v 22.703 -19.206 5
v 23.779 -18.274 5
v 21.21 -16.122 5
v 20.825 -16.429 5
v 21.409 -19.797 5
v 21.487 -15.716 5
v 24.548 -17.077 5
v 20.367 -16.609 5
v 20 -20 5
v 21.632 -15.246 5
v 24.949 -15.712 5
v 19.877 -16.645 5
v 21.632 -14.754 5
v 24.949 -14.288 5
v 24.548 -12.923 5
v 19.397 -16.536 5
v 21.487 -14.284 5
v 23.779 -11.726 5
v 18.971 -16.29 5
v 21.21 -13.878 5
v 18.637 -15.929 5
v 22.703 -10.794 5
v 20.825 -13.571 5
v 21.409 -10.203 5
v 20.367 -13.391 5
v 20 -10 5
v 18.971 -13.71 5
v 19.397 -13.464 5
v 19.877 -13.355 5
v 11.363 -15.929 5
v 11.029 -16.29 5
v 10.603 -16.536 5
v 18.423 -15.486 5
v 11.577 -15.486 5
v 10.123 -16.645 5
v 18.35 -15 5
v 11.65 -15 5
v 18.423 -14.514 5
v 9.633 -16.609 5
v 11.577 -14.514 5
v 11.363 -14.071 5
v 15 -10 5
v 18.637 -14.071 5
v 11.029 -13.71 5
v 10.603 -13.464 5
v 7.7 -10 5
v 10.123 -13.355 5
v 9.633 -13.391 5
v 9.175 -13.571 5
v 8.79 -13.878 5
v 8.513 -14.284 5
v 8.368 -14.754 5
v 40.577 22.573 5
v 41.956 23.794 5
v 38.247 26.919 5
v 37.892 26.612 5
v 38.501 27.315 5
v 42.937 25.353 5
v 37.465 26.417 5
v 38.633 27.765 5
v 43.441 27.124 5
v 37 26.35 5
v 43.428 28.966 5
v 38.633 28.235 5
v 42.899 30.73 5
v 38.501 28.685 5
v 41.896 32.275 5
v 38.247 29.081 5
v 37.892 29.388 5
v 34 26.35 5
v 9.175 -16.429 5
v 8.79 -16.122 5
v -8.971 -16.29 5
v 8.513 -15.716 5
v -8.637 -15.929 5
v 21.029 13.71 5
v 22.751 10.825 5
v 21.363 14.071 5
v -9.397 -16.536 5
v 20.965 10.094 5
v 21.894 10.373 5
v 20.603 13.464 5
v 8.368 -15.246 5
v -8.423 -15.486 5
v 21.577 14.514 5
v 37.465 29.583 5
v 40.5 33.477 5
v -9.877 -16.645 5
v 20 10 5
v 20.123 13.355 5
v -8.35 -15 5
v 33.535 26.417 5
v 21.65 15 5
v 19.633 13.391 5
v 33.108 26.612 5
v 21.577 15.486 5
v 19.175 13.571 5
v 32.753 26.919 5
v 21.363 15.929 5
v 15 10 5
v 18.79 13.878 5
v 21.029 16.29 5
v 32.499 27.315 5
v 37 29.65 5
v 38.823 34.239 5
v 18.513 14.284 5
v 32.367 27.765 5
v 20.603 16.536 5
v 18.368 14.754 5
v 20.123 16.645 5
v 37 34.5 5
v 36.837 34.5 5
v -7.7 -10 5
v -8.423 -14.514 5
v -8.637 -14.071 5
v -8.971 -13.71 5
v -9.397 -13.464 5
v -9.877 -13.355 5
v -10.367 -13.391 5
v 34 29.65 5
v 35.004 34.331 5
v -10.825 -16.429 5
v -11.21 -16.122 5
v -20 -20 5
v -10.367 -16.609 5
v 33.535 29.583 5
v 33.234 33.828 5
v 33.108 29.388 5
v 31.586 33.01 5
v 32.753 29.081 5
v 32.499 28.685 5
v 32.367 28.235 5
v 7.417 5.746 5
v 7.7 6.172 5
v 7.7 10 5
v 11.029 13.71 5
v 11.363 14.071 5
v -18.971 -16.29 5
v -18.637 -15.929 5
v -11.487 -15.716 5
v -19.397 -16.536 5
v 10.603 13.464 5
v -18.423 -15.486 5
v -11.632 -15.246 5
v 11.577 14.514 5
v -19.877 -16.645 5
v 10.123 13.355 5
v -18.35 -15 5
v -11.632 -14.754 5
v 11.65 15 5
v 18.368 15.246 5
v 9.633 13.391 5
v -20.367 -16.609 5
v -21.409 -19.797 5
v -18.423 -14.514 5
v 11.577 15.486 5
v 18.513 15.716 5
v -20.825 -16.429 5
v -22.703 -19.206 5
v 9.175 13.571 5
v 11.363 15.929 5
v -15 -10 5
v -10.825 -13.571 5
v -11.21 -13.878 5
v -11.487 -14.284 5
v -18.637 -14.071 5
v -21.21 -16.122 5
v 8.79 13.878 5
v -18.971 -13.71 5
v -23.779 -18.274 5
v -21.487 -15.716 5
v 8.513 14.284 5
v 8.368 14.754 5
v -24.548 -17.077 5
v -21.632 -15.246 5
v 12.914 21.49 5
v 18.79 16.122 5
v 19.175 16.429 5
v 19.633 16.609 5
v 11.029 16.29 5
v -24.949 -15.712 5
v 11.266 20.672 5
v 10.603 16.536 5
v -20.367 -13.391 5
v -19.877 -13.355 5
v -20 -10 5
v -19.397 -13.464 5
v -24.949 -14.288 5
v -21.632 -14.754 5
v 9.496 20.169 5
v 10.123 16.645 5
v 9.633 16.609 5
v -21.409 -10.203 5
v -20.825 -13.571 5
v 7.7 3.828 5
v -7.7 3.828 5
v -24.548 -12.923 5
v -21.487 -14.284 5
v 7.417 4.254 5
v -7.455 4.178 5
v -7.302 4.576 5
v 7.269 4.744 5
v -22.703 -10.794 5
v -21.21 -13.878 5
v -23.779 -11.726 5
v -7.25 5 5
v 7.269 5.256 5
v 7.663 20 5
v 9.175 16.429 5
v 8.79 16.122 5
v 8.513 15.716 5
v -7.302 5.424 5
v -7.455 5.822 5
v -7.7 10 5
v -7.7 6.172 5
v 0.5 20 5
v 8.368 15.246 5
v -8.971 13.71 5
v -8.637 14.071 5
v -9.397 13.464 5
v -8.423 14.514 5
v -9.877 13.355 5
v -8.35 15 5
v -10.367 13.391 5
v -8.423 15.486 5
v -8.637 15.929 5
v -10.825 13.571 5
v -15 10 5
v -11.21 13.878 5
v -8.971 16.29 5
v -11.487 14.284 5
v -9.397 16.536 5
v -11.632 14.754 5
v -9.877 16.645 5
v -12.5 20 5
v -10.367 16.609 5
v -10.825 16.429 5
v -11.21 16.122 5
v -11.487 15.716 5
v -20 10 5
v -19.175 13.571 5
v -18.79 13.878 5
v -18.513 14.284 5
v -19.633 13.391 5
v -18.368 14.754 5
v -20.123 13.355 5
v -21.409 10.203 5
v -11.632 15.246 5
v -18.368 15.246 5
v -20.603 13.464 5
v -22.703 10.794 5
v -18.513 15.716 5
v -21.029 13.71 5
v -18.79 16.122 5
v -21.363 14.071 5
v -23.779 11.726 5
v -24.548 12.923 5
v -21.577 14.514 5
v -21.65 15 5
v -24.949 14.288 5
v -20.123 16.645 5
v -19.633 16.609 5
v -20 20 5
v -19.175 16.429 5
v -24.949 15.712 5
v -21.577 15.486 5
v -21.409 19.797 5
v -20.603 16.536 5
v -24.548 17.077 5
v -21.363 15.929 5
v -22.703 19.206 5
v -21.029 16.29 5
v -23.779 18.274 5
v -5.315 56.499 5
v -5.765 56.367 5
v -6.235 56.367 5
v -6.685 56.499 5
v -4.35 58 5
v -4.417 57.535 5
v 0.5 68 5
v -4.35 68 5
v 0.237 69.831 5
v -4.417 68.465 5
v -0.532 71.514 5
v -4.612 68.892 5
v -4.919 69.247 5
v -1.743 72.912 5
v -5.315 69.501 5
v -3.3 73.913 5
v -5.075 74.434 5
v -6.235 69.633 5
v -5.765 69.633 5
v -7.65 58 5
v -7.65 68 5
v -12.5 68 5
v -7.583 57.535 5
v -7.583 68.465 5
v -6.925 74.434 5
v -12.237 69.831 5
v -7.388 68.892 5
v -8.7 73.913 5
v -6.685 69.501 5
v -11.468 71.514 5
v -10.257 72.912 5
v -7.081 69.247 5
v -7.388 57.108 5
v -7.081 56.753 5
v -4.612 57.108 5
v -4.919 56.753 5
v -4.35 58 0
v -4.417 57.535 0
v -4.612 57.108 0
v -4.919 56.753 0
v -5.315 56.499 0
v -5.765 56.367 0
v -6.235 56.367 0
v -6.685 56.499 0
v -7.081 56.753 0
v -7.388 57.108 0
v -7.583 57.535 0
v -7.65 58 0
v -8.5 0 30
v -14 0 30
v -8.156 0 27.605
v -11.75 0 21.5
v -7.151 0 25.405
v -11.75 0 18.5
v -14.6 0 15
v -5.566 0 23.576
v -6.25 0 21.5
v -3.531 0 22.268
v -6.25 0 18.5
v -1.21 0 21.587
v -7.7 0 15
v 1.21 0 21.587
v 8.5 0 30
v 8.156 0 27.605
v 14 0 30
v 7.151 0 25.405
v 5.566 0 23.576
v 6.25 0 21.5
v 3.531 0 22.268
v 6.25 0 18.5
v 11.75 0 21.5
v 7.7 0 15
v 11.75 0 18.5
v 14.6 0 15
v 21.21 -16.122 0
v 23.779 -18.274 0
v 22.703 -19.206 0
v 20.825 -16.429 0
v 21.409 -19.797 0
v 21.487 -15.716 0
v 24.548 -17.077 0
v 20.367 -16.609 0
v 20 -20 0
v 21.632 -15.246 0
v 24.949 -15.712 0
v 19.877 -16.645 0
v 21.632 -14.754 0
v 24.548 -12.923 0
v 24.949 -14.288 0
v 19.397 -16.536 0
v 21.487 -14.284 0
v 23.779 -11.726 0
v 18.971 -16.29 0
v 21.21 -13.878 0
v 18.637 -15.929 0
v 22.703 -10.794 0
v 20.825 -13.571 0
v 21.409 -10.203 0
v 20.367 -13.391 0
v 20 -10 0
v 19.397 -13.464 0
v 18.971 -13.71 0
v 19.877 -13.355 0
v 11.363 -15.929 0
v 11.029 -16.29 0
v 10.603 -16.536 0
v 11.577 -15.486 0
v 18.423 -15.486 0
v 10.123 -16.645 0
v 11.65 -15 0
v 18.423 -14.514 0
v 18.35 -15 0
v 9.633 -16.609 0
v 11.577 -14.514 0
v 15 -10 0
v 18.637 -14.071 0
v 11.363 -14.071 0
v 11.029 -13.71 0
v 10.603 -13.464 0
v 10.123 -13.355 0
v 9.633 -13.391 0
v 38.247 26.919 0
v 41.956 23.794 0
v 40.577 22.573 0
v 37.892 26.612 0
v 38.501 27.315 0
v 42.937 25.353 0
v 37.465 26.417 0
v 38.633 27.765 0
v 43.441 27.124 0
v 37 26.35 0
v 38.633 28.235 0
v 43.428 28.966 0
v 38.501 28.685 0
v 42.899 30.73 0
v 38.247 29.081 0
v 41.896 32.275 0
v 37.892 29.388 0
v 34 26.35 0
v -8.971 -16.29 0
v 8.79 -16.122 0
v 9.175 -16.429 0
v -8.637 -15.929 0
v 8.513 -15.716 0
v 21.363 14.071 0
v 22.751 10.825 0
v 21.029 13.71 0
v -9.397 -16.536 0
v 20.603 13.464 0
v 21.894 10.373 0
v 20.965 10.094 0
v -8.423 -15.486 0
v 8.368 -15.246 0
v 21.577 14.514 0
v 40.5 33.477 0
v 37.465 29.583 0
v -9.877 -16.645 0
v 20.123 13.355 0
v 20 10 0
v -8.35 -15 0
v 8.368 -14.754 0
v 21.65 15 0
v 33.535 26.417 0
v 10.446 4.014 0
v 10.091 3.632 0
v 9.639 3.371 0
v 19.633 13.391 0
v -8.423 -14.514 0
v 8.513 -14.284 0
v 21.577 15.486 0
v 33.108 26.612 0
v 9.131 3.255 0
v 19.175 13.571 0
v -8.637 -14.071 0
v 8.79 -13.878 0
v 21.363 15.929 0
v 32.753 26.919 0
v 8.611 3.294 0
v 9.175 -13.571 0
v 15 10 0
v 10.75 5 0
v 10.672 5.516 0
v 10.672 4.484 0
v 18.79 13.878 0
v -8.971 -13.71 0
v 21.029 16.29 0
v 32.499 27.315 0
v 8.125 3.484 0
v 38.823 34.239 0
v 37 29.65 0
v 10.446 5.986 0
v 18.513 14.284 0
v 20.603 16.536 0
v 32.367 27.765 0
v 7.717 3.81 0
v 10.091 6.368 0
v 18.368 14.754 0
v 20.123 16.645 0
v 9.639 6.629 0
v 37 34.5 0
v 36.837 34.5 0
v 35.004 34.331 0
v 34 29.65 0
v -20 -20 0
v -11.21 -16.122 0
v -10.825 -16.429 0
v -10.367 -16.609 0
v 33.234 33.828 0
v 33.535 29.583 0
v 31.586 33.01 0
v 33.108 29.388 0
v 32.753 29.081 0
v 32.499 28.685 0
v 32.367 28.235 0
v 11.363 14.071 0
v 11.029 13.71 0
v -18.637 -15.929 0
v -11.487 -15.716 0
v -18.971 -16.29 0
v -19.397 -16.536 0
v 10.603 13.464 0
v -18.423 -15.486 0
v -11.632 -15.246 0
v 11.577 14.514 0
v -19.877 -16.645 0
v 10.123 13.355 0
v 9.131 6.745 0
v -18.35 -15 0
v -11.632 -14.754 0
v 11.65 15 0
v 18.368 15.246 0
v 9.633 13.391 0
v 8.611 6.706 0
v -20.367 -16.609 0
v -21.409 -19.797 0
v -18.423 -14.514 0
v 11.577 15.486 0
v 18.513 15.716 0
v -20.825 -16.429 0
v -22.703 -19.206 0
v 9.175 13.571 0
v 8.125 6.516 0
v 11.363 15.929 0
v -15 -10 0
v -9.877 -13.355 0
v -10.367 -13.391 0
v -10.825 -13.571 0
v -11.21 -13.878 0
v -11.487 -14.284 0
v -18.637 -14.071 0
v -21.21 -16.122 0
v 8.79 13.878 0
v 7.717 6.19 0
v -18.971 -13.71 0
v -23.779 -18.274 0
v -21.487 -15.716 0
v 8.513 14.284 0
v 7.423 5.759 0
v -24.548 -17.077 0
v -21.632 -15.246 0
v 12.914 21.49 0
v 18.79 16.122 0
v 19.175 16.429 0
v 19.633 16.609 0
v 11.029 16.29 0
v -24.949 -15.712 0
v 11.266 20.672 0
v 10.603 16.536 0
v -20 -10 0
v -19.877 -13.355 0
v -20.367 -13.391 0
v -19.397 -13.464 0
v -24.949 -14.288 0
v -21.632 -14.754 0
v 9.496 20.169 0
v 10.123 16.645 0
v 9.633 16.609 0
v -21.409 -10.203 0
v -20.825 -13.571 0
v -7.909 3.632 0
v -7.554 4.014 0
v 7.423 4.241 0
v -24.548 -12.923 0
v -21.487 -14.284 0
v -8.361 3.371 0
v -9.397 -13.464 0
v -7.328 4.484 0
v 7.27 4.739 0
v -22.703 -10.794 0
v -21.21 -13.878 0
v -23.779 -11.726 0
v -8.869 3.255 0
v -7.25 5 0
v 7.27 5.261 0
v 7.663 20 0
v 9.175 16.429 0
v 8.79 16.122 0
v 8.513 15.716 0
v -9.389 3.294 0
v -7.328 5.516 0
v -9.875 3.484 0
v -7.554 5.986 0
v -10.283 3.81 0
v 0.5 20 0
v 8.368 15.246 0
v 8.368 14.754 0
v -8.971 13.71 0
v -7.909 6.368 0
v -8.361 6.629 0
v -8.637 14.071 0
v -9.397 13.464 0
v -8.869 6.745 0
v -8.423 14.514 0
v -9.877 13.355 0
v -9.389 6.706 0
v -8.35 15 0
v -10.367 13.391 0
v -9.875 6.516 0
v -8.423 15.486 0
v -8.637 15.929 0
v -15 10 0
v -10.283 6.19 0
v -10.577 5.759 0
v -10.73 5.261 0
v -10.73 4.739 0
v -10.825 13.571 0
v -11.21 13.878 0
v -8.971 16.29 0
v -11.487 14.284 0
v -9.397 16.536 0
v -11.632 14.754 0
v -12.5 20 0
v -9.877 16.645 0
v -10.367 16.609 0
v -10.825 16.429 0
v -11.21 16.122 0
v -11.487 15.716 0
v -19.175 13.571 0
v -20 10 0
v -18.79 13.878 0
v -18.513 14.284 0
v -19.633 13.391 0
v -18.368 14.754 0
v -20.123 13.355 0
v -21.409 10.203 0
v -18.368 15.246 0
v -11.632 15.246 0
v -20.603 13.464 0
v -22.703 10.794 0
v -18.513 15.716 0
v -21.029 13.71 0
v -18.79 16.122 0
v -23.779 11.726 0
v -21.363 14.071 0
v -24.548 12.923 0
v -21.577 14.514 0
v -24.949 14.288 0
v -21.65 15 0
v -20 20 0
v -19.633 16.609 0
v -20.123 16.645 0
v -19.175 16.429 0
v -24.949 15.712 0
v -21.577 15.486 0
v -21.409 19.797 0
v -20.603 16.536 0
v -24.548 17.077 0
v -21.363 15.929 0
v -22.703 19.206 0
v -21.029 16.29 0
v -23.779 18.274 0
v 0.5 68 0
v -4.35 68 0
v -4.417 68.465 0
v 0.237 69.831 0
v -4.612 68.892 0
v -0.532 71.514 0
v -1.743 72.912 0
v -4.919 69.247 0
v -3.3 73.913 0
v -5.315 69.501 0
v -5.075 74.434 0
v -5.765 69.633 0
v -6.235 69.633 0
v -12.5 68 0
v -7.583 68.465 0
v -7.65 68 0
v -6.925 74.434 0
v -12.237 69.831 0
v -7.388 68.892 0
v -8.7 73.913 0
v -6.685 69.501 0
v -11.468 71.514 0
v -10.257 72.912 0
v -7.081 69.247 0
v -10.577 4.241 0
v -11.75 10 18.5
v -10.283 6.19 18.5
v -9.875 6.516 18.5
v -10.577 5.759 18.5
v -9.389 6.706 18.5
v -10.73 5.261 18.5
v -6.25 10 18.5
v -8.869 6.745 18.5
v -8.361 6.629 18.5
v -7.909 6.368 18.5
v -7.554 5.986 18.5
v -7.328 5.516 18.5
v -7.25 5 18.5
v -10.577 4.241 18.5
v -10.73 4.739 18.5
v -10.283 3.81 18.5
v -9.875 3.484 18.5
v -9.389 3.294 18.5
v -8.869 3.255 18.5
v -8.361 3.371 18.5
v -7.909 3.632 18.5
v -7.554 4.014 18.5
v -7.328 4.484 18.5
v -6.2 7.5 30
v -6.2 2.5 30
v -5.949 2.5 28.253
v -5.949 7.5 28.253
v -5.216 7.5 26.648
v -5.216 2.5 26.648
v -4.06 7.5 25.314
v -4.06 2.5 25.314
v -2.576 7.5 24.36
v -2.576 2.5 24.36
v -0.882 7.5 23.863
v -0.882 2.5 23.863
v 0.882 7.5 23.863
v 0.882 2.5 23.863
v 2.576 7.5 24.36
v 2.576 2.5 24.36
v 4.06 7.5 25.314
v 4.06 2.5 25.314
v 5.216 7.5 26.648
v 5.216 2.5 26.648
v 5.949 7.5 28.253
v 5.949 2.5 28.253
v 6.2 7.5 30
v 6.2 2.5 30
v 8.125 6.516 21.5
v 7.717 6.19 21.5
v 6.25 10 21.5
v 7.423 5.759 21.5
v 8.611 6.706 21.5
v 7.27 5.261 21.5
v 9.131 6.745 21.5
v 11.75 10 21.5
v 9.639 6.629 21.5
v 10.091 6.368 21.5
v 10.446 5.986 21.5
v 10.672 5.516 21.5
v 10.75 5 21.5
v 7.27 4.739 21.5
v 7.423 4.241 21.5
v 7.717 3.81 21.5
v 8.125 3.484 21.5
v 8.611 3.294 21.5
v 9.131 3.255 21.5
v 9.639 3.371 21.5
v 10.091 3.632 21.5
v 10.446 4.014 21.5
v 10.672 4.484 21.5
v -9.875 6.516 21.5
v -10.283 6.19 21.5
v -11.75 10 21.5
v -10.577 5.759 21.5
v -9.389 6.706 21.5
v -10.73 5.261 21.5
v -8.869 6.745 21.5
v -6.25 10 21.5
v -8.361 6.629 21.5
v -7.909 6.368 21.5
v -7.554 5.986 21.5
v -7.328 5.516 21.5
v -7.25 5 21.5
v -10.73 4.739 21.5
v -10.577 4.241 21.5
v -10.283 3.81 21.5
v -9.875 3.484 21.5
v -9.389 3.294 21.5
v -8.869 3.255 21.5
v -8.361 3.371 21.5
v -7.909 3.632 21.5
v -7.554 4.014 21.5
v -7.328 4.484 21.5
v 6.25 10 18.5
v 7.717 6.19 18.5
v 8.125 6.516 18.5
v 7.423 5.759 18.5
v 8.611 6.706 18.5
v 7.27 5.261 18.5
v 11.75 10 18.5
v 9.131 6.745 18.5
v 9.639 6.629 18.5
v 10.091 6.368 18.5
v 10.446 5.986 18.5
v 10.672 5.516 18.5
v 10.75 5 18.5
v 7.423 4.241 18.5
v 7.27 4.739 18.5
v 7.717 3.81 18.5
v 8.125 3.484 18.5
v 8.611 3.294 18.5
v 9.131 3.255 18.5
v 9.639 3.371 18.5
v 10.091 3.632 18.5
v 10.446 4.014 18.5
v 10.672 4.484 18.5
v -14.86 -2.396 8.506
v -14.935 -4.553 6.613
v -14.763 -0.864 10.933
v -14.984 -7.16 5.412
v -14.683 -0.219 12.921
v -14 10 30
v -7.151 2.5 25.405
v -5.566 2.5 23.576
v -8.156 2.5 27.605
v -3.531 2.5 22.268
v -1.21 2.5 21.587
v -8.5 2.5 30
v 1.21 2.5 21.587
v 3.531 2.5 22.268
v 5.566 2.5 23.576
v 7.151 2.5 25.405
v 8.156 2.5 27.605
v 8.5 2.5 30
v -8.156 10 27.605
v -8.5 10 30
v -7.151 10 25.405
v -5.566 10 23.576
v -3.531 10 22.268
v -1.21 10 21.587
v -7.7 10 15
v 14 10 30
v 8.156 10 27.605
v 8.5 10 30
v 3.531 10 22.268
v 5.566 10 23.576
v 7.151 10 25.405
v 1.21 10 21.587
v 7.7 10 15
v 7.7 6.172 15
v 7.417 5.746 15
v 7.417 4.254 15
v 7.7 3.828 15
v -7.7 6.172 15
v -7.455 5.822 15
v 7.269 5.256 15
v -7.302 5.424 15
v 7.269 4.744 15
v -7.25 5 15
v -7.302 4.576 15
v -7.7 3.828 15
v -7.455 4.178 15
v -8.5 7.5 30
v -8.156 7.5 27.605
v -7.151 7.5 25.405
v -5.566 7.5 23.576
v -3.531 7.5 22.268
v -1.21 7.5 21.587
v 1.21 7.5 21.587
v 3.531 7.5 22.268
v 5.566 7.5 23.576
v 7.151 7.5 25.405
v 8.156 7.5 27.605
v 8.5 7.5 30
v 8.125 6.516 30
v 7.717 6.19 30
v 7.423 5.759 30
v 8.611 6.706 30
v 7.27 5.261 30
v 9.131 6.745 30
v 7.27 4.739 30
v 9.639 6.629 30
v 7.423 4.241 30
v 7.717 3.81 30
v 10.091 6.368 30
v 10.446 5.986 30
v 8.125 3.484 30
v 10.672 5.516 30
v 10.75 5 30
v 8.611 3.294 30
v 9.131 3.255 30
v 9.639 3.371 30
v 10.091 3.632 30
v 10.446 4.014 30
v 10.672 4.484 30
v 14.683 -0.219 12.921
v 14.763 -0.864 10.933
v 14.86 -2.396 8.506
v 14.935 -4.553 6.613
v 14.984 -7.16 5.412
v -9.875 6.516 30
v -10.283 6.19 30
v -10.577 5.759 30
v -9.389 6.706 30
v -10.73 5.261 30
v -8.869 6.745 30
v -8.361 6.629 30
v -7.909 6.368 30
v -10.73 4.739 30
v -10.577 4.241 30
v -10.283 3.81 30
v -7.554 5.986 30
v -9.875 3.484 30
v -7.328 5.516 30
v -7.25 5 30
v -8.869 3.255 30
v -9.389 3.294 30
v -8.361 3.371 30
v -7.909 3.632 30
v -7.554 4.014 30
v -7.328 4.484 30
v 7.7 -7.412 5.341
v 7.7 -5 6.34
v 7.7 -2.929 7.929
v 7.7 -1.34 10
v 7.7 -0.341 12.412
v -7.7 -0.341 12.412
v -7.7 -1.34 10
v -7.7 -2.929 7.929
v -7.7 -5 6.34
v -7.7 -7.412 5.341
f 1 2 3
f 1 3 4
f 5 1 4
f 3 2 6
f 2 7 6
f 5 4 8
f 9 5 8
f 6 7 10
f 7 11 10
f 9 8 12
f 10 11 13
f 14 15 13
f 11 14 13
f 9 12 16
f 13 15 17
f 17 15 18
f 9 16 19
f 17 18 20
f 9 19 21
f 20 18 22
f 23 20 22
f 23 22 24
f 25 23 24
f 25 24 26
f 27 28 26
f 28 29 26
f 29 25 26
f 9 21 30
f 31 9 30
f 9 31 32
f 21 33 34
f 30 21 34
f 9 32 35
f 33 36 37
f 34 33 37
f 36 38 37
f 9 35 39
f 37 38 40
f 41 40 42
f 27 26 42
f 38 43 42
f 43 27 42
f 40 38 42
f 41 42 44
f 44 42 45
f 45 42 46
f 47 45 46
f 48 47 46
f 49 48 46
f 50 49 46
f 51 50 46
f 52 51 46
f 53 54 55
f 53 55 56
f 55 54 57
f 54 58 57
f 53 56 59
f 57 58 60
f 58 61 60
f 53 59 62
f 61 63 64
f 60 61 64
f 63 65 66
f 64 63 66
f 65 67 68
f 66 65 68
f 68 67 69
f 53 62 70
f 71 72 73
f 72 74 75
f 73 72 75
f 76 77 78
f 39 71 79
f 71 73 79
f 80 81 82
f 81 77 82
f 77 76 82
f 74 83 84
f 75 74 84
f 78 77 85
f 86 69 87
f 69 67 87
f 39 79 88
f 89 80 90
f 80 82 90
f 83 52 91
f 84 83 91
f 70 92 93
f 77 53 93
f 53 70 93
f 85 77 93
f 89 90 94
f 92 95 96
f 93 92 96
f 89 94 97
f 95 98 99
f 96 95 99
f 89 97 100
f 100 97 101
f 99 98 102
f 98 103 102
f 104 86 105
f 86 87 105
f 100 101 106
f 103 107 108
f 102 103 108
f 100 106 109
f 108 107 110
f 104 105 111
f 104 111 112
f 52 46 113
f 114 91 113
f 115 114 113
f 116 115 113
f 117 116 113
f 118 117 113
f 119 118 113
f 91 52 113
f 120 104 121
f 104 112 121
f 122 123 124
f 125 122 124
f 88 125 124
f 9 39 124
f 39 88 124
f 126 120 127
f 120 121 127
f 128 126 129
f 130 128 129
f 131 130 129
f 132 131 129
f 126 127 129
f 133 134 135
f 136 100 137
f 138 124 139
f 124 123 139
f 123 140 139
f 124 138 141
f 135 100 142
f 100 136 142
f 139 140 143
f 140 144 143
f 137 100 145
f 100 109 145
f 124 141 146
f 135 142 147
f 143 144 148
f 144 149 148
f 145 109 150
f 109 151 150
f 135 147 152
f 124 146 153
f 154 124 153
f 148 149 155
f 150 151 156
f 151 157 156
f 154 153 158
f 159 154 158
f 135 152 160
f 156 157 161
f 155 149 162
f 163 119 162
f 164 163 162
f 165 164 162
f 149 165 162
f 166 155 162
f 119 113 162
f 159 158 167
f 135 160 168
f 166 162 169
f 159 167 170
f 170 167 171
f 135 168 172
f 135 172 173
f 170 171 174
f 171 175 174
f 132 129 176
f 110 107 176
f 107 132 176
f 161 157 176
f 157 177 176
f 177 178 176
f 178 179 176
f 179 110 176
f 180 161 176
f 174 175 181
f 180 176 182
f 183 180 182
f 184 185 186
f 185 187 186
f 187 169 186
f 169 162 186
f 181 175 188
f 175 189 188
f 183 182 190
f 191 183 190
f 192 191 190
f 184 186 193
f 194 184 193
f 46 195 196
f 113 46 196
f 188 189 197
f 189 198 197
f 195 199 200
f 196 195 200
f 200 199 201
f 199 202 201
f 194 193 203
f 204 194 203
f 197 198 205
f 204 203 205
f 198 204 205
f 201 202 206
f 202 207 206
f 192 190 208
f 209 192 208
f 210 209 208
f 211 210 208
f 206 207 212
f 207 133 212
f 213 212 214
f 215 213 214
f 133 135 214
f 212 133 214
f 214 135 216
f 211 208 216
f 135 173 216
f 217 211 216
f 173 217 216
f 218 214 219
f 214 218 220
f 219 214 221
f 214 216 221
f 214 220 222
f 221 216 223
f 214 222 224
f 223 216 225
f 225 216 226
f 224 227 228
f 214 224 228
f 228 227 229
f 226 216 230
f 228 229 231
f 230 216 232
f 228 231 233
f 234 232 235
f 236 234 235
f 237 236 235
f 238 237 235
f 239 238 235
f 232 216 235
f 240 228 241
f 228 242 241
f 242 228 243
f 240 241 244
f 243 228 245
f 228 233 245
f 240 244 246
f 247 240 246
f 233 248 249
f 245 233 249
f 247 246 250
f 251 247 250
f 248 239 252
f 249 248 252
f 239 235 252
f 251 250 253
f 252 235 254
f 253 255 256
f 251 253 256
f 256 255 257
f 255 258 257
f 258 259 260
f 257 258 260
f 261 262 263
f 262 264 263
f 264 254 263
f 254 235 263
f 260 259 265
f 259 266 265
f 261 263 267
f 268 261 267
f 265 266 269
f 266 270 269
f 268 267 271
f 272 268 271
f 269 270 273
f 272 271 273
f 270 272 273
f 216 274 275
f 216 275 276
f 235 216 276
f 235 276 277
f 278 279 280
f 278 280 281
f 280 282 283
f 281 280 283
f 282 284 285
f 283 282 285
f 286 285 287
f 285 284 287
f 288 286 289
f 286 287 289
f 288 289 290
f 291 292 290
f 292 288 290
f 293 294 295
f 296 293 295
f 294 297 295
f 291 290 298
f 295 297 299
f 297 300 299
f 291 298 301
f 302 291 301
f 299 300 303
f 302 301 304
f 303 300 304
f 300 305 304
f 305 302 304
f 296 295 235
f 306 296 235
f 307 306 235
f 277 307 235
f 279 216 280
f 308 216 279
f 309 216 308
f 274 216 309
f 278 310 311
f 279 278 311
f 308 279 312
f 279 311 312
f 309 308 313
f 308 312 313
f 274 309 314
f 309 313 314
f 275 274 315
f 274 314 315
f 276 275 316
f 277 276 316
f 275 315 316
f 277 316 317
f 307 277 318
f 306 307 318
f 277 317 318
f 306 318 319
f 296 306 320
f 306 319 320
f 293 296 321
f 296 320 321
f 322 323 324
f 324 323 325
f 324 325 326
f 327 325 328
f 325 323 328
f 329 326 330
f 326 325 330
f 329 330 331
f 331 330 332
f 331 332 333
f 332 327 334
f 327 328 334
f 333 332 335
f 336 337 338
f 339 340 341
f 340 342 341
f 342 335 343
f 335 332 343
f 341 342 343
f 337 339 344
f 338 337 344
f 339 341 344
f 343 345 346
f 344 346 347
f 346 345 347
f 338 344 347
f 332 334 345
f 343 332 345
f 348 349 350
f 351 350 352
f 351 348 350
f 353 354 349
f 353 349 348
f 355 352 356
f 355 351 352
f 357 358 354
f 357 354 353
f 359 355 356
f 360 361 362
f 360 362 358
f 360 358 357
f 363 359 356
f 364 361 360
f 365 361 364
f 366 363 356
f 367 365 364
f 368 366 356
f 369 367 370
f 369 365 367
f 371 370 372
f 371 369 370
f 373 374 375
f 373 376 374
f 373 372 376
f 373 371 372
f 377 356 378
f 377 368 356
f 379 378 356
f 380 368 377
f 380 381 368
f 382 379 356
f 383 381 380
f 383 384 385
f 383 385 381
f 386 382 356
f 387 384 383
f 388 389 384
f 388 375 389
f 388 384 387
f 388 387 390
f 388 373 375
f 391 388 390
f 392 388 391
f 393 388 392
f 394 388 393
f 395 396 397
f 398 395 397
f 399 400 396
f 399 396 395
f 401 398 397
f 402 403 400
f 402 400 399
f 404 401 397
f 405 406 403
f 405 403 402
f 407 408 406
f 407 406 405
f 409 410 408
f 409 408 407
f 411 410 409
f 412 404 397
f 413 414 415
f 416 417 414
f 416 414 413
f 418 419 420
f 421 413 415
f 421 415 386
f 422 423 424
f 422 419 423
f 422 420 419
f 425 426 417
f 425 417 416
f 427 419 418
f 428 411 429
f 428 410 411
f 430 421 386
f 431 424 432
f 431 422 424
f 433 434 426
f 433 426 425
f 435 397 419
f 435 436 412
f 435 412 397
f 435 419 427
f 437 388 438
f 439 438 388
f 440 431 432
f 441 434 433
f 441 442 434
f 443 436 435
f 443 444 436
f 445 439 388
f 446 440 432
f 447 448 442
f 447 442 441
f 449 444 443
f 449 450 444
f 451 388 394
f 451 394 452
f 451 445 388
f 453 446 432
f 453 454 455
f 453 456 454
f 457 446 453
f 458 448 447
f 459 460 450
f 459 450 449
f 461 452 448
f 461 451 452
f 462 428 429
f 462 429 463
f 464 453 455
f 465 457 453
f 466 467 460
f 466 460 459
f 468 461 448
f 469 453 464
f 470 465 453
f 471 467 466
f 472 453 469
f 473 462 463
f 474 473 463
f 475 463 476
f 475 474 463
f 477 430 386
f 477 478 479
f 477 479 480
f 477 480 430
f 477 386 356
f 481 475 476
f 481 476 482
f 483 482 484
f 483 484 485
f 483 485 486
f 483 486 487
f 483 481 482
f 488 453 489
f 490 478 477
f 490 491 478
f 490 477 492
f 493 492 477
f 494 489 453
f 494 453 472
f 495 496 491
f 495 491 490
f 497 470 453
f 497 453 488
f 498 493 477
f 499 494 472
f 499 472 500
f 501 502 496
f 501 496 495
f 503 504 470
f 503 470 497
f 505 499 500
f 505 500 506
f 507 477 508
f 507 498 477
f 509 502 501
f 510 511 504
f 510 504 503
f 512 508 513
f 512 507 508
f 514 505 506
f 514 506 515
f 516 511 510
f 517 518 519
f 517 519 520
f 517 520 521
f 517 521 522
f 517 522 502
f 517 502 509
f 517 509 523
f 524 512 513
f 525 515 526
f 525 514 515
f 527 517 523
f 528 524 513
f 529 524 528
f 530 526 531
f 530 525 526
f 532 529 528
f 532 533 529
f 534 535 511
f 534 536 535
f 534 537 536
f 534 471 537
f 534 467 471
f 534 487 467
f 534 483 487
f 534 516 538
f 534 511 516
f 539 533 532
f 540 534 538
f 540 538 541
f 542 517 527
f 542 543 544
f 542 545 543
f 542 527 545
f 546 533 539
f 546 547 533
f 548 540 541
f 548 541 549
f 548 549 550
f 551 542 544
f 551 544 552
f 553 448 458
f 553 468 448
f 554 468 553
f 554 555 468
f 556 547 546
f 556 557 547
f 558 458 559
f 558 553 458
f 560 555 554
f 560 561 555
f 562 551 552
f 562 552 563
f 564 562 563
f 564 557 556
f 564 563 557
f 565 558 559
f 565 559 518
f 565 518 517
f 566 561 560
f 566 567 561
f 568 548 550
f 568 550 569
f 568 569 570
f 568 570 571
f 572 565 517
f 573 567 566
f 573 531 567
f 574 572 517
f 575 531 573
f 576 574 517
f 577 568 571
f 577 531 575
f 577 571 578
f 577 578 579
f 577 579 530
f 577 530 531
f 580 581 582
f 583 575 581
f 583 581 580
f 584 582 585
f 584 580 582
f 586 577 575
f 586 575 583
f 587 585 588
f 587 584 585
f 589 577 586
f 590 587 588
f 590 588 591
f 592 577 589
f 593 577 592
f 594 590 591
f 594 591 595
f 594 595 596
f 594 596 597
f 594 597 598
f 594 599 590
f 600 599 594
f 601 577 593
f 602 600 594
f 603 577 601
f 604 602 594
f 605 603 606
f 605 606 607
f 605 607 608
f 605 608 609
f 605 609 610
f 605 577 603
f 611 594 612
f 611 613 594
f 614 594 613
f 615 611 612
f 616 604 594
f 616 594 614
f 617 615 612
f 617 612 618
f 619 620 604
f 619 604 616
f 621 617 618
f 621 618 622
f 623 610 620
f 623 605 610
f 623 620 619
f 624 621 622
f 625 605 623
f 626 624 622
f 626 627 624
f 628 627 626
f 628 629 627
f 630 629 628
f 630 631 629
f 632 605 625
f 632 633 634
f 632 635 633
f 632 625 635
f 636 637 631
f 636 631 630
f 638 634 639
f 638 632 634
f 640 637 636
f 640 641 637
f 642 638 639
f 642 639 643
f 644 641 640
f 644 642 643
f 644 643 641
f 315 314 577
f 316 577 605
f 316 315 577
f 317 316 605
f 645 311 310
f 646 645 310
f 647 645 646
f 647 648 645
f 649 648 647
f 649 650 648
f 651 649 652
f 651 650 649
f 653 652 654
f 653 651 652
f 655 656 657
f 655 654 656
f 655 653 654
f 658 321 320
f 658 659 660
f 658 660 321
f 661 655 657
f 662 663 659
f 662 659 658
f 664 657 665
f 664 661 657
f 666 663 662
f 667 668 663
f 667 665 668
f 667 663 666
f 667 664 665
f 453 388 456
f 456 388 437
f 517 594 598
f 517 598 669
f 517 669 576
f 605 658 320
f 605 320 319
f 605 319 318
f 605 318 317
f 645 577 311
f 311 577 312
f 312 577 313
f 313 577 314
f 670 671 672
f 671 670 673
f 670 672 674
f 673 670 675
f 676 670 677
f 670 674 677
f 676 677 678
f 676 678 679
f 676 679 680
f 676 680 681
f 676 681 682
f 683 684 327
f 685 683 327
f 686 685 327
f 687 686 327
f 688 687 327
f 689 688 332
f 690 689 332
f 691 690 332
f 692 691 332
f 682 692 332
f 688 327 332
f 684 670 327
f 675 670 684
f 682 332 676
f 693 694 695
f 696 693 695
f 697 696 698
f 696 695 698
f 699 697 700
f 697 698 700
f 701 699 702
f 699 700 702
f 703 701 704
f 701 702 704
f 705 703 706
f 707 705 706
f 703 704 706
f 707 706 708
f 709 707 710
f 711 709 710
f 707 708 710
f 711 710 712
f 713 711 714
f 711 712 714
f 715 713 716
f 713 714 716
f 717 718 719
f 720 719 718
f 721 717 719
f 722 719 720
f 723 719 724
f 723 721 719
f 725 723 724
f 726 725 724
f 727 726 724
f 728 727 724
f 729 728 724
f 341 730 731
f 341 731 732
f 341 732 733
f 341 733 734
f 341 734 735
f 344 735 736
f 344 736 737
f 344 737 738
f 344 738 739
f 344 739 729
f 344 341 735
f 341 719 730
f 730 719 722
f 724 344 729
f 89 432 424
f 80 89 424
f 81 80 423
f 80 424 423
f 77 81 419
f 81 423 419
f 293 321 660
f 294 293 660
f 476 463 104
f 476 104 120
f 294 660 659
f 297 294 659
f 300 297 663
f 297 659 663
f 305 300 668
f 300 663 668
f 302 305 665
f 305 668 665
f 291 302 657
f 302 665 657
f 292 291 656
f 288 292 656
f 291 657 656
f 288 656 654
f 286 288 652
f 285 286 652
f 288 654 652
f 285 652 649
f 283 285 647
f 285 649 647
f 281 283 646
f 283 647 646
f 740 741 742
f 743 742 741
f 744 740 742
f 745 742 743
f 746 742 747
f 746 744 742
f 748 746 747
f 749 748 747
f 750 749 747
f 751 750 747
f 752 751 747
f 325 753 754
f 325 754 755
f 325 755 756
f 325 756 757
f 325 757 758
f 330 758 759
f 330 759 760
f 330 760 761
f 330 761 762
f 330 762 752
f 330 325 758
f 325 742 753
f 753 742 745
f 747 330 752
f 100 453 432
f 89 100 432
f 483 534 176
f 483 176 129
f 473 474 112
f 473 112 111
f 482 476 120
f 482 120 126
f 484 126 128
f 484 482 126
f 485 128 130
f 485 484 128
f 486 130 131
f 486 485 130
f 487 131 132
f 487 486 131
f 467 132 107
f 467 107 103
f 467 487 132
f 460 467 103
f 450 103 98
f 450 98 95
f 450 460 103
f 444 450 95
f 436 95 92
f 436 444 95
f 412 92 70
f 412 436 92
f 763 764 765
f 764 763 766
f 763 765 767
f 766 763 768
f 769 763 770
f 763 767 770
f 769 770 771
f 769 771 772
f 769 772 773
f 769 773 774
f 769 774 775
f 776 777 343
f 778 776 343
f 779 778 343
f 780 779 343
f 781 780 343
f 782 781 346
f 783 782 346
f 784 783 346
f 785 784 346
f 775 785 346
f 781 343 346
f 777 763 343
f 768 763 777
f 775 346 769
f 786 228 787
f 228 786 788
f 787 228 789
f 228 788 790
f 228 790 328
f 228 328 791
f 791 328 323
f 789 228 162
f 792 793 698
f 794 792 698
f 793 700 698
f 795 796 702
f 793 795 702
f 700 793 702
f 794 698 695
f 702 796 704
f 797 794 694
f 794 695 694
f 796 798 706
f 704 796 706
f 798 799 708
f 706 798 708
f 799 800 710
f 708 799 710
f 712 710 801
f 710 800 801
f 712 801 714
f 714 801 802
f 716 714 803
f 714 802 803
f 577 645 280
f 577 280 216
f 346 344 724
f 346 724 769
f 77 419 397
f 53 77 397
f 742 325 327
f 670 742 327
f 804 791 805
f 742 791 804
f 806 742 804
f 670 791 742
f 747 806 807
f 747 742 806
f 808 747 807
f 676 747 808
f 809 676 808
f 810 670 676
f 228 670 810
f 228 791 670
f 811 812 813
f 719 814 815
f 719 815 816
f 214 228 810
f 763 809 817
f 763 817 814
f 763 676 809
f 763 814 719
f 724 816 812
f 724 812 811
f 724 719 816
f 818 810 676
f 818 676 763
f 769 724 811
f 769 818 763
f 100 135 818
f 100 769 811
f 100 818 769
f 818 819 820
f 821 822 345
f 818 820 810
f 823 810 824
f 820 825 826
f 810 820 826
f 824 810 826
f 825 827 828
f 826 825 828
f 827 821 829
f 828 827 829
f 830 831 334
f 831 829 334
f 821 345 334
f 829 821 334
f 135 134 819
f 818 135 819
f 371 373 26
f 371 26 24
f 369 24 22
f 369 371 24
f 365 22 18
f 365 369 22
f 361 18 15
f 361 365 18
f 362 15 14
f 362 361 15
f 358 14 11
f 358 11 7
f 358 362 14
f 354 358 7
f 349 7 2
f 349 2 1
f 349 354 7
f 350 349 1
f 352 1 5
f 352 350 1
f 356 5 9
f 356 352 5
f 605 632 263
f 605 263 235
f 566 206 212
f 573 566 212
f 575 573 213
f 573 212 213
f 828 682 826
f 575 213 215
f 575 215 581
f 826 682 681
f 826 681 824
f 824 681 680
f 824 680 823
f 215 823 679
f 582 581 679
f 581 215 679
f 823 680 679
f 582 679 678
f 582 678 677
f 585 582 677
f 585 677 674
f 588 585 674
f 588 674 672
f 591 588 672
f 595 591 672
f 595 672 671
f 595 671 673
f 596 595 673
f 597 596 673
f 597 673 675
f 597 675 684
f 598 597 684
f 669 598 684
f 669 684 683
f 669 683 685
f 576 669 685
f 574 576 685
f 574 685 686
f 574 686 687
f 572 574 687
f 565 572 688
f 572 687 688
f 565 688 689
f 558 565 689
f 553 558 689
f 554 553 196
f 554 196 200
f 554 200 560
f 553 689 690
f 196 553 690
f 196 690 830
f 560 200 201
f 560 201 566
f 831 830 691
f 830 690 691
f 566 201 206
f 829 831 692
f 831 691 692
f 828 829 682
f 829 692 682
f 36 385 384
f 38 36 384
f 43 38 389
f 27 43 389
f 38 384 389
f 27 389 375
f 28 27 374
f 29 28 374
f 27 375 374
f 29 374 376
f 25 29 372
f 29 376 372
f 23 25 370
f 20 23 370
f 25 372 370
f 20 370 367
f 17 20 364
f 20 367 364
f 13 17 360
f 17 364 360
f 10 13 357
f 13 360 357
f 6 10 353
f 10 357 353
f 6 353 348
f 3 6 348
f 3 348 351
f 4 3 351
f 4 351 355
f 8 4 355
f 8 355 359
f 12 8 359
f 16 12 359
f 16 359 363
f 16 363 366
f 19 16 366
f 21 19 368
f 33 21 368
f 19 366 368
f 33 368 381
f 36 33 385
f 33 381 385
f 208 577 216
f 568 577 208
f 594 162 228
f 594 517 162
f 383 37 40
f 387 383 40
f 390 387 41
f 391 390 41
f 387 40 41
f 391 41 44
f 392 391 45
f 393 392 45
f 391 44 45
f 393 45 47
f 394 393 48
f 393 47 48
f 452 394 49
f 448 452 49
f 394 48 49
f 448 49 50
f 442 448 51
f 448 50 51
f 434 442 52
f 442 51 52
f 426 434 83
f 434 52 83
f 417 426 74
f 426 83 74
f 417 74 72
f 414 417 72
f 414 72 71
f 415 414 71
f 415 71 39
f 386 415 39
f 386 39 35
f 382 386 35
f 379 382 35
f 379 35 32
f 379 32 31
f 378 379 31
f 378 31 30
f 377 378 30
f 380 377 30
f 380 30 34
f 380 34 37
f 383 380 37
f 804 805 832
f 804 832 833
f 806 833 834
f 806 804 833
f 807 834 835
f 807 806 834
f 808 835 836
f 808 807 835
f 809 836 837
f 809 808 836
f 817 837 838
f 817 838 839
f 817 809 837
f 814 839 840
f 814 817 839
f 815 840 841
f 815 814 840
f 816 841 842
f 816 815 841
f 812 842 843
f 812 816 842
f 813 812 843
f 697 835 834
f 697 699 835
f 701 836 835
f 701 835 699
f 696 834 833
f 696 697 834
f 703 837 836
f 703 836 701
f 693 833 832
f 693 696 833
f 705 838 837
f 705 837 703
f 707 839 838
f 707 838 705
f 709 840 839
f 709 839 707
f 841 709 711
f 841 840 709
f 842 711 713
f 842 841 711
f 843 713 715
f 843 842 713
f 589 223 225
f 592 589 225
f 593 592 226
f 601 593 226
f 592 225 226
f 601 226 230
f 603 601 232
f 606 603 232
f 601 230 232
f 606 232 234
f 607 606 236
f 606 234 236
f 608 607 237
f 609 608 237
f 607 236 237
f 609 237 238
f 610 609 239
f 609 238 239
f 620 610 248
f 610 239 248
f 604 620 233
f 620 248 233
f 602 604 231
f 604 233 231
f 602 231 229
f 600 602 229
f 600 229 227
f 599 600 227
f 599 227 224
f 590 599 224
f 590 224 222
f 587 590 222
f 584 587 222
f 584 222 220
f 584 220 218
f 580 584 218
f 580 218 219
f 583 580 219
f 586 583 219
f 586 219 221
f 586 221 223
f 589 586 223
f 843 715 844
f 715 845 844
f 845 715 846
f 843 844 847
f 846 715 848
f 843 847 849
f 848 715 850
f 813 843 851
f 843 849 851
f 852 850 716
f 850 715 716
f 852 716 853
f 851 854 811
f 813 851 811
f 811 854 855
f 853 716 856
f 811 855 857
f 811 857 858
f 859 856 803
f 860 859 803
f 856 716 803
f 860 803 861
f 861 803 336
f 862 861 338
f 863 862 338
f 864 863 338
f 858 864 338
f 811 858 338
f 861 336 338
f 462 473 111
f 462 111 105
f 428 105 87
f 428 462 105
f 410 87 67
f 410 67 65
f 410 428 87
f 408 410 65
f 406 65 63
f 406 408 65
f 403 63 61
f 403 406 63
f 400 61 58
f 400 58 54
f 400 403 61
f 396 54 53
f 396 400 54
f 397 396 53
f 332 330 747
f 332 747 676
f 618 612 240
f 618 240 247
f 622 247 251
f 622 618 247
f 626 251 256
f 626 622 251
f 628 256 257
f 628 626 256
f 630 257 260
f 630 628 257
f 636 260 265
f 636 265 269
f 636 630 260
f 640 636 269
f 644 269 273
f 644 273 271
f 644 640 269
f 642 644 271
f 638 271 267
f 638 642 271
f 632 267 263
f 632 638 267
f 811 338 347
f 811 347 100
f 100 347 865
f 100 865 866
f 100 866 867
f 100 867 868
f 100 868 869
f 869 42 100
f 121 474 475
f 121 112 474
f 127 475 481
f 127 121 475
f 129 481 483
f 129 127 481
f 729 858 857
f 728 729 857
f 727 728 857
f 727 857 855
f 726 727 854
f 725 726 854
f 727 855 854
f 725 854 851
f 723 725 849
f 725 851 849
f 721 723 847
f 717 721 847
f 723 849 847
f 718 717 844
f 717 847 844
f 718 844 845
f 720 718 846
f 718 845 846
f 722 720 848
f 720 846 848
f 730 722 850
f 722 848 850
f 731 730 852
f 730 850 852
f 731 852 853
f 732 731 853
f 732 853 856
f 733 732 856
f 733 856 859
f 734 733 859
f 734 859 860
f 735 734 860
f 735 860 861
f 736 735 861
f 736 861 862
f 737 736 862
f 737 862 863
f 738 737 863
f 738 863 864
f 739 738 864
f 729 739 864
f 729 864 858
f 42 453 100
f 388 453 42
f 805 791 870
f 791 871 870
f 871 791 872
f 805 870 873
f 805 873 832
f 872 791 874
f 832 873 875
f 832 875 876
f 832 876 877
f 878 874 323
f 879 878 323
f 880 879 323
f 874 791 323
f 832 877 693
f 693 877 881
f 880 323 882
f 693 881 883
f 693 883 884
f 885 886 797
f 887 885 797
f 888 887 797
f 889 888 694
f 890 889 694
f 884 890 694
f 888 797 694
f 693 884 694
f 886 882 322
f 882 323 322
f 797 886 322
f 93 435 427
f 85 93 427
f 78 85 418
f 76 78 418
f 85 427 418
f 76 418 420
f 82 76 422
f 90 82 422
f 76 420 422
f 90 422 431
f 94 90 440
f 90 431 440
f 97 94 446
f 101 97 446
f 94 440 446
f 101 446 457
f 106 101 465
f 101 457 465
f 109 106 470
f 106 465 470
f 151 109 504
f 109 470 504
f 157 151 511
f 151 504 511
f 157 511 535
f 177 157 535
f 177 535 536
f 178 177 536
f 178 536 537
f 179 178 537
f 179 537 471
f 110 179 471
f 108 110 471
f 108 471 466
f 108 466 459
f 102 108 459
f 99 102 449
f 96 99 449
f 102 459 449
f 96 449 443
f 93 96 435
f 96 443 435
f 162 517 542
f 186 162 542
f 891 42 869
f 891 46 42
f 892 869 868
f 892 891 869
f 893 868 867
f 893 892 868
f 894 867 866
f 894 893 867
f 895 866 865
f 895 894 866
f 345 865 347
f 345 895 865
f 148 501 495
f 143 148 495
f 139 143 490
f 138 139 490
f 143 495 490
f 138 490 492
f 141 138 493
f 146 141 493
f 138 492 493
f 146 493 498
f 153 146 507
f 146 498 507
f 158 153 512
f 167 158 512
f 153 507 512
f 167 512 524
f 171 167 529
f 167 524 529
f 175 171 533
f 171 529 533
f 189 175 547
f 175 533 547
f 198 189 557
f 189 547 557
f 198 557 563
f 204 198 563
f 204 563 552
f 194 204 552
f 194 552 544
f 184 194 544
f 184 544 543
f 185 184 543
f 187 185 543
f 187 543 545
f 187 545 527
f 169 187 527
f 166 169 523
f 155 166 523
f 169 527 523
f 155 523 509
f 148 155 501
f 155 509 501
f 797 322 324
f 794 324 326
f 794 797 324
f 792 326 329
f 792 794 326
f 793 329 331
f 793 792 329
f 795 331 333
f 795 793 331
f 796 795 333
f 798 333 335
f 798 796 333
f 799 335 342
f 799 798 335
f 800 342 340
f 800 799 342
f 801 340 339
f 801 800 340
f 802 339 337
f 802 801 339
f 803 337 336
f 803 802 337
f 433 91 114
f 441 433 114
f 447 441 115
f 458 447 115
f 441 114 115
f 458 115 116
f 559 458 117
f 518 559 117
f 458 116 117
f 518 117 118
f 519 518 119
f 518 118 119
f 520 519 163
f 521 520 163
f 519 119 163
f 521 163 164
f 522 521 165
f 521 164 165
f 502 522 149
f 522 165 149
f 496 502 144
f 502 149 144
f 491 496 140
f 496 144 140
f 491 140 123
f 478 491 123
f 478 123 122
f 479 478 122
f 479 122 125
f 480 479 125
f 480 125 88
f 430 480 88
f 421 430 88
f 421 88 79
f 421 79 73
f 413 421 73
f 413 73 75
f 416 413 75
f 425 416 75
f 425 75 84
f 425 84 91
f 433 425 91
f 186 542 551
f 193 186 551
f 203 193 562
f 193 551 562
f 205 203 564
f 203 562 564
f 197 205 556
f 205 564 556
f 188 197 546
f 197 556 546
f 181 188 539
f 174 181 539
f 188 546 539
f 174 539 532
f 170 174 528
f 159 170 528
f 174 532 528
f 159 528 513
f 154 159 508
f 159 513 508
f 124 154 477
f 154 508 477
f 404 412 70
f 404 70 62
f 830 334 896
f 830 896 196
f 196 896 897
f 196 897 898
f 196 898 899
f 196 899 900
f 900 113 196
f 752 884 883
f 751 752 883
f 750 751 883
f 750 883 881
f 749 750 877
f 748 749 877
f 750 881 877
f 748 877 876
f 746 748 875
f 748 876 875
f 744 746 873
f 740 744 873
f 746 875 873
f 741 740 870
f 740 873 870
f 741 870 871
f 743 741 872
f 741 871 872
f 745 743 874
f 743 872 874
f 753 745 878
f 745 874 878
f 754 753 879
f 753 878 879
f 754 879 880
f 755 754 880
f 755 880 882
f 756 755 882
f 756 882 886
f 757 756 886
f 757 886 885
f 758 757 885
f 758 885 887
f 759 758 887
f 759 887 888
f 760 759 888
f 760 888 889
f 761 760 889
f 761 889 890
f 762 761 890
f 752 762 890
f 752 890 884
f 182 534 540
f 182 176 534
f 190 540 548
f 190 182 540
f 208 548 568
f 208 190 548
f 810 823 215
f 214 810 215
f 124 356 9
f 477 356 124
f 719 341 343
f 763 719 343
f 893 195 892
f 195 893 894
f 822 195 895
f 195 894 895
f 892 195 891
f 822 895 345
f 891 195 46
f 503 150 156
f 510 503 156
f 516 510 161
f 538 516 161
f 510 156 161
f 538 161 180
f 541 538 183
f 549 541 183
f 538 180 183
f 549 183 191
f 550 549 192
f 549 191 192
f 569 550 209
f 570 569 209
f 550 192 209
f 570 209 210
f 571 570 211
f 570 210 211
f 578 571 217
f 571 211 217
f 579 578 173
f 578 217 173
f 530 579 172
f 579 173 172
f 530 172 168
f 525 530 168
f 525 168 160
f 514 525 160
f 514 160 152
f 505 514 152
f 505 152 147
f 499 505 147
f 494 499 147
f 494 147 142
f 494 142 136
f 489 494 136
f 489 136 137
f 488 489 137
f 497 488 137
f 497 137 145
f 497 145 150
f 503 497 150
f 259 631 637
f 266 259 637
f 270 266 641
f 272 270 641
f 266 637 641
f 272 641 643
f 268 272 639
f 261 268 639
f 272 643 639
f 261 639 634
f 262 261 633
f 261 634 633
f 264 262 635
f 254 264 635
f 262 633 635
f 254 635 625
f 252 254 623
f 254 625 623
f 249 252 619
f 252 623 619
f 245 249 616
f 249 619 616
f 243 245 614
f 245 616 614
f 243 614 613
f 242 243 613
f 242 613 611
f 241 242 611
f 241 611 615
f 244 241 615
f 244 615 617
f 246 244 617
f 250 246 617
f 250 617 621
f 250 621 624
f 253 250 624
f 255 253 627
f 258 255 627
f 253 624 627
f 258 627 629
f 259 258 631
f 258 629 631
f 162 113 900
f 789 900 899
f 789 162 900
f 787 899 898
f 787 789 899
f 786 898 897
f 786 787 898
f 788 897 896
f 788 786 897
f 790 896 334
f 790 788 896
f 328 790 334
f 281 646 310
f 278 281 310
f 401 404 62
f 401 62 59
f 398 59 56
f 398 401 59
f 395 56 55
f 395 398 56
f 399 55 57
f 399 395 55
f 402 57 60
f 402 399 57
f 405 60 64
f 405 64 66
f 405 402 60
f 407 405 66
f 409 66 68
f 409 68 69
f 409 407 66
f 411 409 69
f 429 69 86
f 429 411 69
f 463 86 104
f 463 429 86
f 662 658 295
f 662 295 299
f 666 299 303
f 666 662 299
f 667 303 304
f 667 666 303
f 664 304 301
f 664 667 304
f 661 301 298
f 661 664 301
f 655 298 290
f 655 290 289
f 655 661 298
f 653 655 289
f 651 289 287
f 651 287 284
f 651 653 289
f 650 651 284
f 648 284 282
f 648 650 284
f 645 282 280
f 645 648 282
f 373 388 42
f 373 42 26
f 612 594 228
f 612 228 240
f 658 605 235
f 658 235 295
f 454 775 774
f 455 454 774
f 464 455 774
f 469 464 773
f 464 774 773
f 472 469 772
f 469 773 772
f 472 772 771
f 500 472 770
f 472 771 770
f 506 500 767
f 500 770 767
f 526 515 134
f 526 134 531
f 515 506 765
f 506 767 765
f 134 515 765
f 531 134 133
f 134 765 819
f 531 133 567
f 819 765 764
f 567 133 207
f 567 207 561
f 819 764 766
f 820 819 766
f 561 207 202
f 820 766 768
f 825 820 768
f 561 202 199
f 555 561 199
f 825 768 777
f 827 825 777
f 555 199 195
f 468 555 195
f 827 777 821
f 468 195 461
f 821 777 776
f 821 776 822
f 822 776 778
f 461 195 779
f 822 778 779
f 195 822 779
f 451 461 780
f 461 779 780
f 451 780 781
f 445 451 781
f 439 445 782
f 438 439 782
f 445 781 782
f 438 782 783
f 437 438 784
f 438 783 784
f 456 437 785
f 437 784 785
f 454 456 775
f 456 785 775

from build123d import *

# Parameters (mm, degrees)
RESSALTO_EXTRUS_O1_DEPTH = 5
ESBO_O2_W                = 5.5
ESBO_O2_H                = 3
RESSALTO_EXTRUS_O2_DEPTH = 10
ESBO_O4_W                = 8.5
ESBO_O4_H                = 2.5
ESBO_O6_R                = 1.75
CORTE_EXTRUS_O2_DEPTH    = 92.337287019
ESBO_O7_R                = 1.65
CORTE_EXTRUS_O3_DEPTH    = 10
ESBO_O8_R                = 1.65
RESSALTO_EXTRUS_O3_DEPTH = 5
FILETE3_R                = 10
FILETE4_R                = 10


with BuildPart() as part:
    # Esboço1 → Ressalto-extrusão1 (new body)
    with BuildSketch(Plane.XY):
        with BuildLine():
            Line((0.5, 68), (0.5, 33.5))
            Line((0.5, 33.5), (0.5, 20))
            Line((0.5, 20), (10.5, 20))
            Line((10.5, 20), (34, 34.5))
            Line((34, 34.5), (37, 34.5))
            ThreePointArc((37, 34.5), (43.5, 28), (37, 21.5))
            Line((37, 21.5), (15, 21.5))
            Line((15, 21.5), (15, -20))
            Line((15, -20), (-15, -20))
            Line((-15, -20), (-15, 20))
            Line((-15, 20), (-12.5, 20))
            Line((-12.5, 20), (-12.5, 68))
            ThreePointArc((-12.5, 68), (-6, 74.5), (0.5, 68))
        make_face()
        with BuildLine():
            Line((-4.35, 68), (-4.35, 58))
            ThreePointArc((-4.35, 58), (-6, 56.35), (-7.65, 58))
            Line((-7.65, 58), (-7.65, 68))
            ThreePointArc((-7.65, 68), (-6, 69.65), (-4.35, 68))
        make_face(mode=Mode.SUBTRACT)
        with BuildLine():
            Line((34, 26.35), (37, 26.35))
            ThreePointArc((37, 26.35), (38.65, 28), (37, 29.65))
            Line((37, 29.65), (34, 29.65))
            ThreePointArc((34, 29.65), (32.35, 28), (34, 26.35))
        make_face(mode=Mode.SUBTRACT)
    extrude(amount=RESSALTO_EXTRUS_O1_DEPTH)

    # Esboço2 → Ressalto-extrusão2 (add)
    with BuildSketch(Plane(origin=(0, 0, 0), x_dir=(1, 0, 0), z_dir=(0, 1, 0))):
        with BuildLine():
            Line((14, -30), (15, -5))
            Line((15, -5), (7.7, -5))
            Line((7.7, -5), (7.7, -15))
            Line((7.7, -15), (-7.7, -15))
            Line((-7.7, -15), (-7.7, -5))
            Line((-7.7, -5), (-15, -5))
            Line((-15, -5), (-14, -30))
            Line((-14, -30), (-6.2, -30))
            ThreePointArc((-6.2, -30), (0, -23.8), (6.2, -30))
            Line((6.2, -30), (14, -30))
        make_face()
        with Locations((-9, -20)):
            Rectangle(ESBO_O2_W, ESBO_O2_H, mode=Mode.SUBTRACT)
        with Locations((9, -20)):
            Rectangle(ESBO_O2_W, ESBO_O2_H, mode=Mode.SUBTRACT)
    extrude(amount=RESSALTO_EXTRUS_O2_DEPTH)

    # Esboço4 → Corte-Revolução3 (revolve, cut)
    with BuildSketch(Plane(origin=(0, 0, 0), x_dir=(0, 0, -1), z_dir=(1, 0, 0))):
        with Locations((-25.75, 8.75)):
            Rectangle(ESBO_O4_W, ESBO_O4_H)
        with Locations((-25.75, 1.25)):
            Rectangle(ESBO_O4_W, ESBO_O4_H)
    revolve(axis=Axis((0, 10, 30), (0, -1, 0)), mode=Mode.SUBTRACT)

    # Esboço6 → Corte-extrusão2 (cut, through all)
    with BuildSketch(Plane.XY.offset(30)):
        with Locations((-9, 5)):
            Circle(ESBO_O6_R)
        with Locations((9, 5)):
            Circle(ESBO_O6_R)
    extrude(amount=-CORTE_EXTRUS_O2_DEPTH, mode=Mode.SUBTRACT)

    # Esboço7 → Corte-extrusão3 (cut)
    with BuildSketch(Plane.XY.offset(5)):
        with Locations((-10, 15)):
            Circle(ESBO_O7_R)
        with Locations((-10, -15)):
            Circle(ESBO_O7_R)
        with Locations((10, -15)):
            Circle(ESBO_O7_R)
        with Locations((10, 15)):
            Circle(ESBO_O7_R)
    extrude(amount=-CORTE_EXTRUS_O3_DEPTH, mode=Mode.SUBTRACT)

    # Esboço8 → Ressalto-extrusão3 (add)
    # profile 1 of 4: a face of its own
    with BuildSketch(Plane(origin=(0, 0, 0), x_dir=(-1, 0, 0), z_dir=(0, 0, -1))):
        with BuildLine():
            Line((20, 20), (15, 20))
            Line((15, 20), (15, 10))
            Line((15, 10), (20, 10))
            ThreePointArc((20, 10), (25, 15), (20, 20))
        make_face()
        with Locations((20, 15)):
            Circle(ESBO_O8_R, mode=Mode.SUBTRACT)
    # profile 2 of 4: a face of its own
    with BuildSketch(Plane(origin=(0, 0, 0), x_dir=(-1, 0, 0), z_dir=(0, 0, -1))):
        with BuildLine():
            Line((-15, 10), (-20, 10))
            ThreePointArc((-20, 10), (-21.436224898, 10.210714245), (-22.751396578, 10.825096783))
            Line((-22.751396578, 10.825096783), (-40.576815551, 22.572625818))
            ThreePointArc((-40.576815551, 22.572625818), (-38.867092367, 21.773928519), (-37, 21.5))
            Line((-37, 21.5), (-15, 21.5))
            Line((-15, 21.5), (-15, 10))
        make_face()
        with Locations(Location((-20, 15, 0), (0, 0, 180))):
            Circle(ESBO_O8_R, mode=Mode.SUBTRACT)
    # profile 3 of 4: a face of its own
    with BuildSketch(Plane(origin=(0, 0, 0), x_dir=(-1, 0, 0), z_dir=(0, 0, -1))):
        with BuildLine():
            Line((15, -10), (20, -10))
            ThreePointArc((20, -10), (25, -15), (20, -20))
            Line((20, -20), (15, -20))
            Line((15, -20), (15, -10))
        make_face()
        with Locations(Location((20, -15, 0), (0, 0, 180))):
            Circle(ESBO_O8_R, mode=Mode.SUBTRACT)
    # profile 4 of 4: a face of its own
    with BuildSketch(Plane(origin=(0, 0, 0), x_dir=(-1, 0, 0), z_dir=(0, 0, -1))):
        with BuildLine():
            Line((-20, -20), (-15, -20))
            Line((-15, -20), (-15, -10))
            Line((-15, -10), (-20, -10))
            ThreePointArc((-20, -10), (-25, -15), (-20, -20))
        make_face()
        with Locations((-20, -15)):
            Circle(ESBO_O8_R, mode=Mode.SUBTRACT)
    extrude(amount=-RESSALTO_EXTRUS_O3_DEPTH)

    # Filete3
    filete3_edges = [part.edges().sort_by_distance(p)[0] for p in [
        (10.5, 20, 2.5),
        (34, 34.5, 2.5),
    ]]
    fillet(filete3_edges, radius=FILETE3_R)

    # Filete4
    filete4_edges = [part.edges().sort_by_distance(p)[0] for p in [
        (-11.35, 0, 5),
        (11.35, 0, 5),
    ]]
    fillet(filete4_edges, radius=FILETE4_R - 0.0001)  # a hair under: the kernel refuses the full size


solid = part.part
